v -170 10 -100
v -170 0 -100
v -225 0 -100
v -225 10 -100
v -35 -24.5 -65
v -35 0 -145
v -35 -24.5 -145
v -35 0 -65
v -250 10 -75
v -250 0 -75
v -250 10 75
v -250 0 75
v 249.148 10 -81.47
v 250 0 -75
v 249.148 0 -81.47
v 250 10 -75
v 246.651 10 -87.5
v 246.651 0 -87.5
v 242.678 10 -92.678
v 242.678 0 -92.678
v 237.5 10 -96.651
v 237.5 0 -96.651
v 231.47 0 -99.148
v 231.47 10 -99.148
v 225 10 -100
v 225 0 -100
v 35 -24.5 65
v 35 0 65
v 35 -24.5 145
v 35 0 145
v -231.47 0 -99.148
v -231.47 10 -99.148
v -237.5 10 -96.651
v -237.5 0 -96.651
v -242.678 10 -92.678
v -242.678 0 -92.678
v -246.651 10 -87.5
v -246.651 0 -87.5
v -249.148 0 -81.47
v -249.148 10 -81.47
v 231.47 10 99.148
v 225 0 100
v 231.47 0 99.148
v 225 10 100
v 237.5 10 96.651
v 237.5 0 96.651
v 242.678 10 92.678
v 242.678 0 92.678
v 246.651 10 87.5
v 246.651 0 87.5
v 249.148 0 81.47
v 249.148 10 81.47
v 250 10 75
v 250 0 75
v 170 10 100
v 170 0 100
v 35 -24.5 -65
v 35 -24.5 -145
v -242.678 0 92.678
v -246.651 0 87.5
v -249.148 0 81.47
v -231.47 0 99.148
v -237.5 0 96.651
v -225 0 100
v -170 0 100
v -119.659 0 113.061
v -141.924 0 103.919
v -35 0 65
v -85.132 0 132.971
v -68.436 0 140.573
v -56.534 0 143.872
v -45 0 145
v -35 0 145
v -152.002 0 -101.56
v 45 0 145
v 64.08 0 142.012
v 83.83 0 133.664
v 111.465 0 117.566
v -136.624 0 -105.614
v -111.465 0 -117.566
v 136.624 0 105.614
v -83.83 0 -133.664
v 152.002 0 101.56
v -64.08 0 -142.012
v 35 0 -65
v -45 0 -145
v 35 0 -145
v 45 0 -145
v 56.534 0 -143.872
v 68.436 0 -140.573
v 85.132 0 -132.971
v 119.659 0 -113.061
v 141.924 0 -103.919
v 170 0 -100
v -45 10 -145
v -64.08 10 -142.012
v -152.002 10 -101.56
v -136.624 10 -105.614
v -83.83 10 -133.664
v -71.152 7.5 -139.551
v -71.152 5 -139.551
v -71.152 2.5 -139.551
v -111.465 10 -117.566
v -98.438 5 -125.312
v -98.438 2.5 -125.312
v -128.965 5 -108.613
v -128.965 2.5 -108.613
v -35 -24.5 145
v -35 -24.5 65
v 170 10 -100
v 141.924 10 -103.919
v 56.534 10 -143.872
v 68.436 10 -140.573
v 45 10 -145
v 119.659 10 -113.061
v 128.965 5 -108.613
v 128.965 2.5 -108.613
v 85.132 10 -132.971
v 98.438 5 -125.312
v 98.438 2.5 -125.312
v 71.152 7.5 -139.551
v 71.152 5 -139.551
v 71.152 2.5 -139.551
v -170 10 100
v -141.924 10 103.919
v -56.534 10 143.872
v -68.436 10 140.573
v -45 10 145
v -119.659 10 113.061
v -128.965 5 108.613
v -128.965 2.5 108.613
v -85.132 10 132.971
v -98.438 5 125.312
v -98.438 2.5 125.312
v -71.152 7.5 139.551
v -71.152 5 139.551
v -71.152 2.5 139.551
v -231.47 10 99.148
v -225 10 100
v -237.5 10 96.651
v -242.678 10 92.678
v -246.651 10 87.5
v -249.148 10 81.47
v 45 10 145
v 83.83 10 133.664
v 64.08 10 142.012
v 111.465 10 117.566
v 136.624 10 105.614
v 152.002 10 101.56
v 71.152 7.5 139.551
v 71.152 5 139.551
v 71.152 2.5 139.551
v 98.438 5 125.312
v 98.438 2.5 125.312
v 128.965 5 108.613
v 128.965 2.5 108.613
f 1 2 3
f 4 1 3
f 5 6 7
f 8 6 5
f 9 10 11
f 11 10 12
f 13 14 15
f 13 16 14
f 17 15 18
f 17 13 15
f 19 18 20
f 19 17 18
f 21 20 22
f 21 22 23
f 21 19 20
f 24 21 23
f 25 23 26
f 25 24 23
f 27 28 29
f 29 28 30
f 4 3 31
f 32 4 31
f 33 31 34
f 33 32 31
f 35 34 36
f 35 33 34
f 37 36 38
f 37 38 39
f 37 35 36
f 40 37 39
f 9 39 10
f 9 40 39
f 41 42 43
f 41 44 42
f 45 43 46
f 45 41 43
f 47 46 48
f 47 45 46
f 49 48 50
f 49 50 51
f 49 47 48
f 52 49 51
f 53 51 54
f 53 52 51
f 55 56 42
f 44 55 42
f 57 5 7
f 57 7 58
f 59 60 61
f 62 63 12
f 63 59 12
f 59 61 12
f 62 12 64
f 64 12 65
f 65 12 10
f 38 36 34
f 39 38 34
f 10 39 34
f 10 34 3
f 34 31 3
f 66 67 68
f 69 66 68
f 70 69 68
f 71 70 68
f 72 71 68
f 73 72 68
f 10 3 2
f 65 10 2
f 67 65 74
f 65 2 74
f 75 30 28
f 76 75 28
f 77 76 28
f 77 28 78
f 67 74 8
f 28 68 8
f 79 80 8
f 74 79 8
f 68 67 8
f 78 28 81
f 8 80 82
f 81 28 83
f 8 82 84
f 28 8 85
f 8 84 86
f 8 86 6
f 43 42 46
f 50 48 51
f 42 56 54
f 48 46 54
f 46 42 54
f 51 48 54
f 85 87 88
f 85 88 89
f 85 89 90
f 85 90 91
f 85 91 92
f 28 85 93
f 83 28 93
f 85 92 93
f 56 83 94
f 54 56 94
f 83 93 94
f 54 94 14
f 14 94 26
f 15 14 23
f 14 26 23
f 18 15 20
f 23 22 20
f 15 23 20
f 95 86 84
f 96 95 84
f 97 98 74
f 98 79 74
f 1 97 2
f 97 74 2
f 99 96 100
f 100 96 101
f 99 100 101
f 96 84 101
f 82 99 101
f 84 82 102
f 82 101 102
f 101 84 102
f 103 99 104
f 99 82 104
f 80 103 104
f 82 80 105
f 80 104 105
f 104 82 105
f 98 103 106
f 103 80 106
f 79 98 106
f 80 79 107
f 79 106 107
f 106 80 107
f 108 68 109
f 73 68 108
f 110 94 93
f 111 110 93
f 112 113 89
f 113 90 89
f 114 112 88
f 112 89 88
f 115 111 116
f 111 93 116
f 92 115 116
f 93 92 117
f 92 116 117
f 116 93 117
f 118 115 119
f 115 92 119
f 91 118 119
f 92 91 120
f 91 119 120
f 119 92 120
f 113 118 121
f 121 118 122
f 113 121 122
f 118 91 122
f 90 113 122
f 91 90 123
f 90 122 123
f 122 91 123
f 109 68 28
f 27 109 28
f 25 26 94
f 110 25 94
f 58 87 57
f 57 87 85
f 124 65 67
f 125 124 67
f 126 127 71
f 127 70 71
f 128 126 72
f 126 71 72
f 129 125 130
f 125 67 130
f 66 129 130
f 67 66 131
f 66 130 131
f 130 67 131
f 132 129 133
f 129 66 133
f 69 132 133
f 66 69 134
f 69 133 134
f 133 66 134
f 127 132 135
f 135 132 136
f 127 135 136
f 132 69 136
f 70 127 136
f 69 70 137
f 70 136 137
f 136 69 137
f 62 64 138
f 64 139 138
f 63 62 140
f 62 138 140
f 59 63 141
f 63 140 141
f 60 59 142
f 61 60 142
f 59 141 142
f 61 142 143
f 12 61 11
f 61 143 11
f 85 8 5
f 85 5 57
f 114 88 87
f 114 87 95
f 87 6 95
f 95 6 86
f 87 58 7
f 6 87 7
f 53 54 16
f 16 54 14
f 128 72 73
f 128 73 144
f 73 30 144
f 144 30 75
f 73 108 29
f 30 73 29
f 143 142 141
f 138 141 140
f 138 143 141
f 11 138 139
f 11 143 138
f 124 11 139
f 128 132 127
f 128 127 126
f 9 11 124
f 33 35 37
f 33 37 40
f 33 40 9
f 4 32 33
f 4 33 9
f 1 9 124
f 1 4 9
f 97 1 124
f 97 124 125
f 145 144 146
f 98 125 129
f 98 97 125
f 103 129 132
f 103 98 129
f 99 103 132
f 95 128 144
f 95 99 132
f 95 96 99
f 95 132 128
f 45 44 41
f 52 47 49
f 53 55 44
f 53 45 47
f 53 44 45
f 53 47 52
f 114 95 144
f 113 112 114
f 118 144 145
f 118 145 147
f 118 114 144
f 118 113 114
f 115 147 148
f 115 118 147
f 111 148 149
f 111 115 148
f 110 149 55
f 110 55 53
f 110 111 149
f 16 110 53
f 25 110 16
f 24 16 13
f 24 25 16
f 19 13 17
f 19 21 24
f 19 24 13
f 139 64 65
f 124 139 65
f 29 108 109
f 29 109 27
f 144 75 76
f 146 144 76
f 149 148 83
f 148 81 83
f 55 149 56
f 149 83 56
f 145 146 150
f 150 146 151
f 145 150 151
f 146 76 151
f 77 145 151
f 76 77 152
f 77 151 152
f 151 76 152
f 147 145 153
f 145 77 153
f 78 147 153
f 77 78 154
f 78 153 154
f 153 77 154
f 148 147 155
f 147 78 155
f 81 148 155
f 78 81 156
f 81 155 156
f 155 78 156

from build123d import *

# Parameters (mm, degrees)
BOSS_EXTRUDE1_DEPTH = 10
FILLET1_R           = 25
SKETCH3_W           = 70
SKETCH3_H           = 80
BOSS_EXTRUDE2_DEPTH = 24.5


# Read off the part's stored shape, not the designer's step: Boss-Extrude1
with BuildPart() as part:
    # Boss-Extrude1 outline → Boss-Extrude1 (new body)
    with BuildSketch(Plane(origin=(0, 0, 0), x_dir=(1, 0, 0), z_dir=(0, 1, 0))):
        with BuildLine():
            Line((-250, -100), (-170, -100))
            add(Edge.make_bspline(
                [(-170, -100), (-120, -100), (-100, -130), (-70, -145), (-45, -145)],
                knots=[0, 0, 0, 0, 0, 1, 1, 1, 1, 1], degree=4))
            Line((-45, -145), (45, -145))
            add(Edge.make_bspline(
                [(45, -145), (70, -145), (100, -130), (120, -100), (170, -100)],
                knots=[0, 0, 0, 0, 0, 1, 1, 1, 1, 1], degree=4))
            Line((170, -100), (250, -100))
            Line((250, -100), (250, 100))
            Line((250, 100), (170, 100))
            add(Edge.make_bspline(
                [(170, 100), (120, 100), (100, 130), (70, 145), (45, 145)],
                knots=[0, 0, 0, 0, 0, 1, 1, 1, 1, 1], degree=4))
            Line((45, 145), (-45, 145))
            add(Edge.make_bspline(
                [(-45, 145), (-70, 145), (-100, 130), (-120, 100), (-170, 100)],
                knots=[0, 0, 0, 0, 0, 1, 1, 1, 1, 1], degree=4))
            Line((-170, 100), (-250, 100))
            Line((-250, 100), (-250, -100))
        make_face()
    extrude(amount=BOSS_EXTRUDE1_DEPTH)

    # Fillet1
    fillet1_edges = [part.edges().sort_by_distance(p)[0] for p in [
        (-250, 5, 100),
        (-250, 5, -100),
        (250, 5, -100),
        (250, 5, 100),
    ]]
    fillet(fillet1_edges, radius=FILLET1_R)

    # Sketch3 → Boss-Extrude2 (add)
    with BuildSketch(Plane.XZ):
        with Locations((0, -105)):
            Rectangle(SKETCH3_W, SKETCH3_H)
        with Locations((0, 105)):
            Rectangle(SKETCH3_W, SKETCH3_H)
    extrude(amount=BOSS_EXTRUDE2_DEPTH)


solid = part.part
